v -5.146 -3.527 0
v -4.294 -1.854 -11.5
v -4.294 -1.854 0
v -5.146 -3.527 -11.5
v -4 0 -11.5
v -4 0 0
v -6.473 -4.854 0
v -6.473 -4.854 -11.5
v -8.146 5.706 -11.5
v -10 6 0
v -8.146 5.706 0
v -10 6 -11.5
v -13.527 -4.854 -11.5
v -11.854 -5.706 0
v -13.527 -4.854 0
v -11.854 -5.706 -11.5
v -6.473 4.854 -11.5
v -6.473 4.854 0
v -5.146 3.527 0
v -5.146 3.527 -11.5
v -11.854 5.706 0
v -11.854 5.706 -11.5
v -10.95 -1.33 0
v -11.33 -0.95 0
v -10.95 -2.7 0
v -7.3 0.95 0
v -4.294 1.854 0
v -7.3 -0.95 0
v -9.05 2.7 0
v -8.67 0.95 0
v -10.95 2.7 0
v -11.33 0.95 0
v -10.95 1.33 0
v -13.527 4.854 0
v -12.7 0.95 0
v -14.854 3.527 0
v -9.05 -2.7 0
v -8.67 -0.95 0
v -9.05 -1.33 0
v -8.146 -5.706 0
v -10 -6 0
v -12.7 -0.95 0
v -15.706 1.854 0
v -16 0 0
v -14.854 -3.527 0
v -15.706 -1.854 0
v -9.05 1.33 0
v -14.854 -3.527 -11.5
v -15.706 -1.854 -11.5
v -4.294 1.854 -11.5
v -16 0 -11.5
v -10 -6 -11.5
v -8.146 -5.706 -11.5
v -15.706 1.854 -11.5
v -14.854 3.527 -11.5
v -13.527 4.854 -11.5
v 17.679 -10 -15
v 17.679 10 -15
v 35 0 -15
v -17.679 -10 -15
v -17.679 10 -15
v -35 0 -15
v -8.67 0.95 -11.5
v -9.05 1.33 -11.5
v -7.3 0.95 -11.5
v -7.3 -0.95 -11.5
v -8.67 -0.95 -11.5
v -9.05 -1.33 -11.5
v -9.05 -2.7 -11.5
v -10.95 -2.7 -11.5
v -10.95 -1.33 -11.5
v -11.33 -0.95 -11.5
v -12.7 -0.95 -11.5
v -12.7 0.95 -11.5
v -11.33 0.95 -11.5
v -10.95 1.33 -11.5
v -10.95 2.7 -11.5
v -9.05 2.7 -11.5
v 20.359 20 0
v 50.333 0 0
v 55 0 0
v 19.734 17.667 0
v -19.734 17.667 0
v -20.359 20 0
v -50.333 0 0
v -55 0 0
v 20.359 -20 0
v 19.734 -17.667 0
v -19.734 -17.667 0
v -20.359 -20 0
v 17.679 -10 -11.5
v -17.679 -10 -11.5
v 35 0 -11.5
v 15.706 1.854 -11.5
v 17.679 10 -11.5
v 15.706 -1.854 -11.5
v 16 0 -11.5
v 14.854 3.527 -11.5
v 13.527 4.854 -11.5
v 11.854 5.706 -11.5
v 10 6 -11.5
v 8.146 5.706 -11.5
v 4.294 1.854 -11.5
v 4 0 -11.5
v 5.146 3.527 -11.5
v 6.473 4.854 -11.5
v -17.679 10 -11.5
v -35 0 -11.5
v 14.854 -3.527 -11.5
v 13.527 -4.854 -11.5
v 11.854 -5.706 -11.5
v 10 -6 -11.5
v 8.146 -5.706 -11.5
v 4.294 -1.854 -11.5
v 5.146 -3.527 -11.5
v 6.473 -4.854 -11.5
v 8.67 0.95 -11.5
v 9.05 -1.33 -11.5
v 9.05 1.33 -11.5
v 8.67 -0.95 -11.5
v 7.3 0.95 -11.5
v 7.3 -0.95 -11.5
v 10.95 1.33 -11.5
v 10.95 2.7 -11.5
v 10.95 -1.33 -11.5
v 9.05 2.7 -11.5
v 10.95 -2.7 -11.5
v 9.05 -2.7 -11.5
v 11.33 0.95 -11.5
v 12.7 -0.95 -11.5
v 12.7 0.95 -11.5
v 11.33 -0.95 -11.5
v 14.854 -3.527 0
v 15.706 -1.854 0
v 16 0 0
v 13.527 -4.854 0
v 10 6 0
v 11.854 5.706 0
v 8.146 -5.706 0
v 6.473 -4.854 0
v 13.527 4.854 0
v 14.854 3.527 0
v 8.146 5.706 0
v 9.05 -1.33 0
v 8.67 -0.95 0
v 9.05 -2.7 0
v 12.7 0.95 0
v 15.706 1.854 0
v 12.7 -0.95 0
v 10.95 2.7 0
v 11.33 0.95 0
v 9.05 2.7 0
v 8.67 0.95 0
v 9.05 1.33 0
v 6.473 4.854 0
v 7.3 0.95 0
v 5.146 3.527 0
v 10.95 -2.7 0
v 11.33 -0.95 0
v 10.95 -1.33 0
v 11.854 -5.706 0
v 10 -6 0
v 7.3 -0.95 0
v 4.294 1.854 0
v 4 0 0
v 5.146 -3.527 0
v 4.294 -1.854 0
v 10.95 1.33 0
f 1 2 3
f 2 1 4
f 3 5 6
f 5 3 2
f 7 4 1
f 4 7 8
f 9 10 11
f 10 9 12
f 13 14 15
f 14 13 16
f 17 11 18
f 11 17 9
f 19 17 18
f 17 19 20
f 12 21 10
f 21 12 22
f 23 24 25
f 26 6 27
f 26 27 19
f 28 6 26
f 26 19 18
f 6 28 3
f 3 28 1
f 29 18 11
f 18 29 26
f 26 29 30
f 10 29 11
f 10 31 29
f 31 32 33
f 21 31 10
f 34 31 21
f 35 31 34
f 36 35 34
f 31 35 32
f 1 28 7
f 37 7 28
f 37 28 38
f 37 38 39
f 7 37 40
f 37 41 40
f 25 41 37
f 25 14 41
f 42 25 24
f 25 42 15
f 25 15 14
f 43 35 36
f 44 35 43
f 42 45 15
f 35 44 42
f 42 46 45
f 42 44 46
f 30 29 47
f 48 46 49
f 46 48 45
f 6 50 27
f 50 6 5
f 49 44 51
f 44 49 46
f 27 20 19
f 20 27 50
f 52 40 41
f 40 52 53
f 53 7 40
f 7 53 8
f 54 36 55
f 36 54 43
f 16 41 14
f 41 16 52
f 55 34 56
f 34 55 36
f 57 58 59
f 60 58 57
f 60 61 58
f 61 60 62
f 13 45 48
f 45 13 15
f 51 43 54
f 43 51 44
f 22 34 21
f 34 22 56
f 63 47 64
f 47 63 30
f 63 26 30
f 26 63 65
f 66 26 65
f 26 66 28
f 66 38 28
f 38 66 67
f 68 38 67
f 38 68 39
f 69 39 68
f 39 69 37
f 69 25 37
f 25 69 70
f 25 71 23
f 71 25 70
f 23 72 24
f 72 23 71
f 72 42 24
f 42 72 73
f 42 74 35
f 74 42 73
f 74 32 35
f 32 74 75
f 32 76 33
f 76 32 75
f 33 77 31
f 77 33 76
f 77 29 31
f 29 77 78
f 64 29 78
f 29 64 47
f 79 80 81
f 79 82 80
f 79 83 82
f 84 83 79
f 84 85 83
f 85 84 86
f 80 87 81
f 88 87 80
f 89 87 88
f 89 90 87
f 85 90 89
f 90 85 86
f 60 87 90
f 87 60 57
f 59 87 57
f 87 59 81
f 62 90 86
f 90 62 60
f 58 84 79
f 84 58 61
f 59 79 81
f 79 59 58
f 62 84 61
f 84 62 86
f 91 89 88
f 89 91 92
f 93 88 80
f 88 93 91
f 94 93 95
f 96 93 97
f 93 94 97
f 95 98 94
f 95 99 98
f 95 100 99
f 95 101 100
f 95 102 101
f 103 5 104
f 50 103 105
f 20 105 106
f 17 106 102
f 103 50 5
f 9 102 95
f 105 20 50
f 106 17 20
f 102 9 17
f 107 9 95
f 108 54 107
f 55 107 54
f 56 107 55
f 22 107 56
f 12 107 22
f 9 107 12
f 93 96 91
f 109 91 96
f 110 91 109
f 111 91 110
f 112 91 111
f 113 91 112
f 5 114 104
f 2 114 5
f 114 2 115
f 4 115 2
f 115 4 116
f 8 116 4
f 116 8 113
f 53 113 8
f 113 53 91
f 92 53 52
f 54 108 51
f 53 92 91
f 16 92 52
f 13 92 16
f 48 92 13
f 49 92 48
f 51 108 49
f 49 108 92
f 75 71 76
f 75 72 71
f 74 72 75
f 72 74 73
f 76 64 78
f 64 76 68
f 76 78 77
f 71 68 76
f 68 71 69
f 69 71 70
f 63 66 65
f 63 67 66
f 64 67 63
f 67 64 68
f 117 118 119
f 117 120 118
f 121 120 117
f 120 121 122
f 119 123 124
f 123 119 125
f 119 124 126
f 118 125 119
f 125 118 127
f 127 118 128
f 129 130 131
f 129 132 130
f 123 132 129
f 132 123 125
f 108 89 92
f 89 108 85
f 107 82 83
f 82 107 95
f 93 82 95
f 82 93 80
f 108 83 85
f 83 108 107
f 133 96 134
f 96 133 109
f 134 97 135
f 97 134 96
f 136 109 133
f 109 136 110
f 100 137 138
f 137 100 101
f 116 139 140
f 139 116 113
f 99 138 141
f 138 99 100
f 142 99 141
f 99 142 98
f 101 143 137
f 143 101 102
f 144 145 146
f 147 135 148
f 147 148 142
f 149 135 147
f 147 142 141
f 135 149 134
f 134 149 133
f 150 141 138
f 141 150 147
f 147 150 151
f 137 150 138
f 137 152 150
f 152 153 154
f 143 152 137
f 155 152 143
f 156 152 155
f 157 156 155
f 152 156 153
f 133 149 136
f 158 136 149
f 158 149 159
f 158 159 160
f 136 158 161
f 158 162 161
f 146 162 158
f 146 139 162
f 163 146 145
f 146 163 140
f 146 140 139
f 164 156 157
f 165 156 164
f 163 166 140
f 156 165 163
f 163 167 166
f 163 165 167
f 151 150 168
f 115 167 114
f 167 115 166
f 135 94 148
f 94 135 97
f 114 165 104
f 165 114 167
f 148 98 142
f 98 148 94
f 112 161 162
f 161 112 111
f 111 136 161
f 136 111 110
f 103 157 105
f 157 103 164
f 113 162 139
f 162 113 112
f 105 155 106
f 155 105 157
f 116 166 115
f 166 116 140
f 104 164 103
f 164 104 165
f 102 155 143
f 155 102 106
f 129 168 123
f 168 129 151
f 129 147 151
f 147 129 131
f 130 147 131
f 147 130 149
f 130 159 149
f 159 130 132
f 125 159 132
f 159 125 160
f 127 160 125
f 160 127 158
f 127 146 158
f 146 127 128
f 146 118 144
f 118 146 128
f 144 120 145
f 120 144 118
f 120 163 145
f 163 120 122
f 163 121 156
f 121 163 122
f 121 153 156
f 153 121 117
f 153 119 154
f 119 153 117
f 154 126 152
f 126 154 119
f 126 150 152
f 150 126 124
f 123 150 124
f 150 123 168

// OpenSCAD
module wedge( length, width, height )
{
    rotate(v=[0,0,1],a=90) 
    rotate(v=[1,0,0],a=90) 
    linear_extrude( height=length,
                    center=false )
    {
        polygon([[0,0], [width,0], [0,height]]);
    }
}

module diamond_quarter( width=20, ridge_length=5, body_length=25, peak_length=55, height=30, truncation=15 )
{
    A = [ 0, width, 0 ];
    B = [ body_length, width, 0 ];
    C = [ peak_length, 0, 0 ];
    D = [ 0, 0, height ];
    E = [ ridge_length, 0, height ];

    intersection()
    {
        wedge( length=peak_length, width=width, height=height );
        translate([peak_length,0,0]) rotate([0,0,-30]) translate([-9*peak_length,-10*width,0]) wedge( length=peak_length*10, width=10*width, height=10*height );
        cube( [peak_length*2, width*2, truncation] );
    }
}

module diamond( width=20, ridge_length=5, body_length=25, peak_length=55, height=30, truncation=15 )
{
    union()
    {
        diamond_quarter( width=width, ridge_length=ridge_length, body_length=body_length, peak_length=peak_length, height=height, truncation=truncation );
        mirror([1,0,0]) diamond_quarter( width=width, ridge_length=ridge_length, body_length=body_length, peak_length=peak_length, height=height, truncation=truncation );
        mirror([0,1,0])
        {
            diamond_quarter( width=width, ridge_length=ridge_length, body_length=body_length, peak_length=peak_length, height=height, truncation=truncation );
            mirror([1,0,0]) diamond_quarter( width=width, ridge_length=ridge_length, body_length=body_length, peak_length=peak_length, height=height, truncation=truncation );
        }
    }        
}

module diamond_shell( width=20, ridge_length=5, body_length=25, peak_length=55, height=30, truncation=15, shell_thickness=3.5 )
{
    difference()
    {
        #diamond( width=width,
                 ridge_length=ridge_length,
                 body_length=body_length,
                 peak_length=peak_length,
                 height=height, 
                 truncation=truncation );
        translate([0,0,-shell_thickness])
        diamond( width=width,
                 ridge_length=ridge_length,
                 body_length=body_length,
                 peak_length=peak_length,
                 height=height, 
                 truncation=truncation );
    }
}

//m z_neg_axle
module z_neg_axle(X_clearance=1.9, length) {
  safe_diam = 5.4;
  safe_rad = 0.5 * safe_diam;
  linear_extrude(height = length,
                 center = true, convexity = 0, twist = 0) {
    polygon(points = [
      [0.5 * X_clearance,  0.7 * X_clearance],
      [0.7 * X_clearance,  0.5 * X_clearance],
      [safe_rad,           0.5 * X_clearance],
      [safe_rad,          -0.5 * X_clearance],
      [0.7 * X_clearance, -0.5 * X_clearance],
      [0.5 * X_clearance, -0.7 * X_clearance],
      [0.5 * X_clearance, -safe_rad],
      [-0.5 * X_clearance,-safe_rad],
      [-0.5 * X_clearance,-0.7 * X_clearance],
      [-0.7 * X_clearance,-0.5 * X_clearance],
      [-safe_rad,         -0.5 * X_clearance],
      [-safe_rad,          0.5 * X_clearance],
      [-0.7 * X_clearance, 0.5 * X_clearance],
      [-0.5 * X_clearance, 0.7 * X_clearance],
      [-0.5 * X_clearance, safe_rad],
      [ 0.5 * X_clearance, safe_rad]
    ] );
  }
}

truncation=15;
axle_support_radius = 6;
rotate([180,0,0])
union()
{
    translate([-10,0,0]) difference()
    {
        cylinder( h=truncation, r=axle_support_radius, $fn=20 );
        z_neg_axle( length=13*2 ); // z_neg_axle is centred on x=y=0
    }
    diamond_shell( truncation=truncation );
    translate([10,0,0]) difference()
    {
        cylinder( h=truncation, r=axle_support_radius, $fn=20 );
        z_neg_axle( length=13*2 ); // z_neg_axle is centred on x=y=0
    }
}
